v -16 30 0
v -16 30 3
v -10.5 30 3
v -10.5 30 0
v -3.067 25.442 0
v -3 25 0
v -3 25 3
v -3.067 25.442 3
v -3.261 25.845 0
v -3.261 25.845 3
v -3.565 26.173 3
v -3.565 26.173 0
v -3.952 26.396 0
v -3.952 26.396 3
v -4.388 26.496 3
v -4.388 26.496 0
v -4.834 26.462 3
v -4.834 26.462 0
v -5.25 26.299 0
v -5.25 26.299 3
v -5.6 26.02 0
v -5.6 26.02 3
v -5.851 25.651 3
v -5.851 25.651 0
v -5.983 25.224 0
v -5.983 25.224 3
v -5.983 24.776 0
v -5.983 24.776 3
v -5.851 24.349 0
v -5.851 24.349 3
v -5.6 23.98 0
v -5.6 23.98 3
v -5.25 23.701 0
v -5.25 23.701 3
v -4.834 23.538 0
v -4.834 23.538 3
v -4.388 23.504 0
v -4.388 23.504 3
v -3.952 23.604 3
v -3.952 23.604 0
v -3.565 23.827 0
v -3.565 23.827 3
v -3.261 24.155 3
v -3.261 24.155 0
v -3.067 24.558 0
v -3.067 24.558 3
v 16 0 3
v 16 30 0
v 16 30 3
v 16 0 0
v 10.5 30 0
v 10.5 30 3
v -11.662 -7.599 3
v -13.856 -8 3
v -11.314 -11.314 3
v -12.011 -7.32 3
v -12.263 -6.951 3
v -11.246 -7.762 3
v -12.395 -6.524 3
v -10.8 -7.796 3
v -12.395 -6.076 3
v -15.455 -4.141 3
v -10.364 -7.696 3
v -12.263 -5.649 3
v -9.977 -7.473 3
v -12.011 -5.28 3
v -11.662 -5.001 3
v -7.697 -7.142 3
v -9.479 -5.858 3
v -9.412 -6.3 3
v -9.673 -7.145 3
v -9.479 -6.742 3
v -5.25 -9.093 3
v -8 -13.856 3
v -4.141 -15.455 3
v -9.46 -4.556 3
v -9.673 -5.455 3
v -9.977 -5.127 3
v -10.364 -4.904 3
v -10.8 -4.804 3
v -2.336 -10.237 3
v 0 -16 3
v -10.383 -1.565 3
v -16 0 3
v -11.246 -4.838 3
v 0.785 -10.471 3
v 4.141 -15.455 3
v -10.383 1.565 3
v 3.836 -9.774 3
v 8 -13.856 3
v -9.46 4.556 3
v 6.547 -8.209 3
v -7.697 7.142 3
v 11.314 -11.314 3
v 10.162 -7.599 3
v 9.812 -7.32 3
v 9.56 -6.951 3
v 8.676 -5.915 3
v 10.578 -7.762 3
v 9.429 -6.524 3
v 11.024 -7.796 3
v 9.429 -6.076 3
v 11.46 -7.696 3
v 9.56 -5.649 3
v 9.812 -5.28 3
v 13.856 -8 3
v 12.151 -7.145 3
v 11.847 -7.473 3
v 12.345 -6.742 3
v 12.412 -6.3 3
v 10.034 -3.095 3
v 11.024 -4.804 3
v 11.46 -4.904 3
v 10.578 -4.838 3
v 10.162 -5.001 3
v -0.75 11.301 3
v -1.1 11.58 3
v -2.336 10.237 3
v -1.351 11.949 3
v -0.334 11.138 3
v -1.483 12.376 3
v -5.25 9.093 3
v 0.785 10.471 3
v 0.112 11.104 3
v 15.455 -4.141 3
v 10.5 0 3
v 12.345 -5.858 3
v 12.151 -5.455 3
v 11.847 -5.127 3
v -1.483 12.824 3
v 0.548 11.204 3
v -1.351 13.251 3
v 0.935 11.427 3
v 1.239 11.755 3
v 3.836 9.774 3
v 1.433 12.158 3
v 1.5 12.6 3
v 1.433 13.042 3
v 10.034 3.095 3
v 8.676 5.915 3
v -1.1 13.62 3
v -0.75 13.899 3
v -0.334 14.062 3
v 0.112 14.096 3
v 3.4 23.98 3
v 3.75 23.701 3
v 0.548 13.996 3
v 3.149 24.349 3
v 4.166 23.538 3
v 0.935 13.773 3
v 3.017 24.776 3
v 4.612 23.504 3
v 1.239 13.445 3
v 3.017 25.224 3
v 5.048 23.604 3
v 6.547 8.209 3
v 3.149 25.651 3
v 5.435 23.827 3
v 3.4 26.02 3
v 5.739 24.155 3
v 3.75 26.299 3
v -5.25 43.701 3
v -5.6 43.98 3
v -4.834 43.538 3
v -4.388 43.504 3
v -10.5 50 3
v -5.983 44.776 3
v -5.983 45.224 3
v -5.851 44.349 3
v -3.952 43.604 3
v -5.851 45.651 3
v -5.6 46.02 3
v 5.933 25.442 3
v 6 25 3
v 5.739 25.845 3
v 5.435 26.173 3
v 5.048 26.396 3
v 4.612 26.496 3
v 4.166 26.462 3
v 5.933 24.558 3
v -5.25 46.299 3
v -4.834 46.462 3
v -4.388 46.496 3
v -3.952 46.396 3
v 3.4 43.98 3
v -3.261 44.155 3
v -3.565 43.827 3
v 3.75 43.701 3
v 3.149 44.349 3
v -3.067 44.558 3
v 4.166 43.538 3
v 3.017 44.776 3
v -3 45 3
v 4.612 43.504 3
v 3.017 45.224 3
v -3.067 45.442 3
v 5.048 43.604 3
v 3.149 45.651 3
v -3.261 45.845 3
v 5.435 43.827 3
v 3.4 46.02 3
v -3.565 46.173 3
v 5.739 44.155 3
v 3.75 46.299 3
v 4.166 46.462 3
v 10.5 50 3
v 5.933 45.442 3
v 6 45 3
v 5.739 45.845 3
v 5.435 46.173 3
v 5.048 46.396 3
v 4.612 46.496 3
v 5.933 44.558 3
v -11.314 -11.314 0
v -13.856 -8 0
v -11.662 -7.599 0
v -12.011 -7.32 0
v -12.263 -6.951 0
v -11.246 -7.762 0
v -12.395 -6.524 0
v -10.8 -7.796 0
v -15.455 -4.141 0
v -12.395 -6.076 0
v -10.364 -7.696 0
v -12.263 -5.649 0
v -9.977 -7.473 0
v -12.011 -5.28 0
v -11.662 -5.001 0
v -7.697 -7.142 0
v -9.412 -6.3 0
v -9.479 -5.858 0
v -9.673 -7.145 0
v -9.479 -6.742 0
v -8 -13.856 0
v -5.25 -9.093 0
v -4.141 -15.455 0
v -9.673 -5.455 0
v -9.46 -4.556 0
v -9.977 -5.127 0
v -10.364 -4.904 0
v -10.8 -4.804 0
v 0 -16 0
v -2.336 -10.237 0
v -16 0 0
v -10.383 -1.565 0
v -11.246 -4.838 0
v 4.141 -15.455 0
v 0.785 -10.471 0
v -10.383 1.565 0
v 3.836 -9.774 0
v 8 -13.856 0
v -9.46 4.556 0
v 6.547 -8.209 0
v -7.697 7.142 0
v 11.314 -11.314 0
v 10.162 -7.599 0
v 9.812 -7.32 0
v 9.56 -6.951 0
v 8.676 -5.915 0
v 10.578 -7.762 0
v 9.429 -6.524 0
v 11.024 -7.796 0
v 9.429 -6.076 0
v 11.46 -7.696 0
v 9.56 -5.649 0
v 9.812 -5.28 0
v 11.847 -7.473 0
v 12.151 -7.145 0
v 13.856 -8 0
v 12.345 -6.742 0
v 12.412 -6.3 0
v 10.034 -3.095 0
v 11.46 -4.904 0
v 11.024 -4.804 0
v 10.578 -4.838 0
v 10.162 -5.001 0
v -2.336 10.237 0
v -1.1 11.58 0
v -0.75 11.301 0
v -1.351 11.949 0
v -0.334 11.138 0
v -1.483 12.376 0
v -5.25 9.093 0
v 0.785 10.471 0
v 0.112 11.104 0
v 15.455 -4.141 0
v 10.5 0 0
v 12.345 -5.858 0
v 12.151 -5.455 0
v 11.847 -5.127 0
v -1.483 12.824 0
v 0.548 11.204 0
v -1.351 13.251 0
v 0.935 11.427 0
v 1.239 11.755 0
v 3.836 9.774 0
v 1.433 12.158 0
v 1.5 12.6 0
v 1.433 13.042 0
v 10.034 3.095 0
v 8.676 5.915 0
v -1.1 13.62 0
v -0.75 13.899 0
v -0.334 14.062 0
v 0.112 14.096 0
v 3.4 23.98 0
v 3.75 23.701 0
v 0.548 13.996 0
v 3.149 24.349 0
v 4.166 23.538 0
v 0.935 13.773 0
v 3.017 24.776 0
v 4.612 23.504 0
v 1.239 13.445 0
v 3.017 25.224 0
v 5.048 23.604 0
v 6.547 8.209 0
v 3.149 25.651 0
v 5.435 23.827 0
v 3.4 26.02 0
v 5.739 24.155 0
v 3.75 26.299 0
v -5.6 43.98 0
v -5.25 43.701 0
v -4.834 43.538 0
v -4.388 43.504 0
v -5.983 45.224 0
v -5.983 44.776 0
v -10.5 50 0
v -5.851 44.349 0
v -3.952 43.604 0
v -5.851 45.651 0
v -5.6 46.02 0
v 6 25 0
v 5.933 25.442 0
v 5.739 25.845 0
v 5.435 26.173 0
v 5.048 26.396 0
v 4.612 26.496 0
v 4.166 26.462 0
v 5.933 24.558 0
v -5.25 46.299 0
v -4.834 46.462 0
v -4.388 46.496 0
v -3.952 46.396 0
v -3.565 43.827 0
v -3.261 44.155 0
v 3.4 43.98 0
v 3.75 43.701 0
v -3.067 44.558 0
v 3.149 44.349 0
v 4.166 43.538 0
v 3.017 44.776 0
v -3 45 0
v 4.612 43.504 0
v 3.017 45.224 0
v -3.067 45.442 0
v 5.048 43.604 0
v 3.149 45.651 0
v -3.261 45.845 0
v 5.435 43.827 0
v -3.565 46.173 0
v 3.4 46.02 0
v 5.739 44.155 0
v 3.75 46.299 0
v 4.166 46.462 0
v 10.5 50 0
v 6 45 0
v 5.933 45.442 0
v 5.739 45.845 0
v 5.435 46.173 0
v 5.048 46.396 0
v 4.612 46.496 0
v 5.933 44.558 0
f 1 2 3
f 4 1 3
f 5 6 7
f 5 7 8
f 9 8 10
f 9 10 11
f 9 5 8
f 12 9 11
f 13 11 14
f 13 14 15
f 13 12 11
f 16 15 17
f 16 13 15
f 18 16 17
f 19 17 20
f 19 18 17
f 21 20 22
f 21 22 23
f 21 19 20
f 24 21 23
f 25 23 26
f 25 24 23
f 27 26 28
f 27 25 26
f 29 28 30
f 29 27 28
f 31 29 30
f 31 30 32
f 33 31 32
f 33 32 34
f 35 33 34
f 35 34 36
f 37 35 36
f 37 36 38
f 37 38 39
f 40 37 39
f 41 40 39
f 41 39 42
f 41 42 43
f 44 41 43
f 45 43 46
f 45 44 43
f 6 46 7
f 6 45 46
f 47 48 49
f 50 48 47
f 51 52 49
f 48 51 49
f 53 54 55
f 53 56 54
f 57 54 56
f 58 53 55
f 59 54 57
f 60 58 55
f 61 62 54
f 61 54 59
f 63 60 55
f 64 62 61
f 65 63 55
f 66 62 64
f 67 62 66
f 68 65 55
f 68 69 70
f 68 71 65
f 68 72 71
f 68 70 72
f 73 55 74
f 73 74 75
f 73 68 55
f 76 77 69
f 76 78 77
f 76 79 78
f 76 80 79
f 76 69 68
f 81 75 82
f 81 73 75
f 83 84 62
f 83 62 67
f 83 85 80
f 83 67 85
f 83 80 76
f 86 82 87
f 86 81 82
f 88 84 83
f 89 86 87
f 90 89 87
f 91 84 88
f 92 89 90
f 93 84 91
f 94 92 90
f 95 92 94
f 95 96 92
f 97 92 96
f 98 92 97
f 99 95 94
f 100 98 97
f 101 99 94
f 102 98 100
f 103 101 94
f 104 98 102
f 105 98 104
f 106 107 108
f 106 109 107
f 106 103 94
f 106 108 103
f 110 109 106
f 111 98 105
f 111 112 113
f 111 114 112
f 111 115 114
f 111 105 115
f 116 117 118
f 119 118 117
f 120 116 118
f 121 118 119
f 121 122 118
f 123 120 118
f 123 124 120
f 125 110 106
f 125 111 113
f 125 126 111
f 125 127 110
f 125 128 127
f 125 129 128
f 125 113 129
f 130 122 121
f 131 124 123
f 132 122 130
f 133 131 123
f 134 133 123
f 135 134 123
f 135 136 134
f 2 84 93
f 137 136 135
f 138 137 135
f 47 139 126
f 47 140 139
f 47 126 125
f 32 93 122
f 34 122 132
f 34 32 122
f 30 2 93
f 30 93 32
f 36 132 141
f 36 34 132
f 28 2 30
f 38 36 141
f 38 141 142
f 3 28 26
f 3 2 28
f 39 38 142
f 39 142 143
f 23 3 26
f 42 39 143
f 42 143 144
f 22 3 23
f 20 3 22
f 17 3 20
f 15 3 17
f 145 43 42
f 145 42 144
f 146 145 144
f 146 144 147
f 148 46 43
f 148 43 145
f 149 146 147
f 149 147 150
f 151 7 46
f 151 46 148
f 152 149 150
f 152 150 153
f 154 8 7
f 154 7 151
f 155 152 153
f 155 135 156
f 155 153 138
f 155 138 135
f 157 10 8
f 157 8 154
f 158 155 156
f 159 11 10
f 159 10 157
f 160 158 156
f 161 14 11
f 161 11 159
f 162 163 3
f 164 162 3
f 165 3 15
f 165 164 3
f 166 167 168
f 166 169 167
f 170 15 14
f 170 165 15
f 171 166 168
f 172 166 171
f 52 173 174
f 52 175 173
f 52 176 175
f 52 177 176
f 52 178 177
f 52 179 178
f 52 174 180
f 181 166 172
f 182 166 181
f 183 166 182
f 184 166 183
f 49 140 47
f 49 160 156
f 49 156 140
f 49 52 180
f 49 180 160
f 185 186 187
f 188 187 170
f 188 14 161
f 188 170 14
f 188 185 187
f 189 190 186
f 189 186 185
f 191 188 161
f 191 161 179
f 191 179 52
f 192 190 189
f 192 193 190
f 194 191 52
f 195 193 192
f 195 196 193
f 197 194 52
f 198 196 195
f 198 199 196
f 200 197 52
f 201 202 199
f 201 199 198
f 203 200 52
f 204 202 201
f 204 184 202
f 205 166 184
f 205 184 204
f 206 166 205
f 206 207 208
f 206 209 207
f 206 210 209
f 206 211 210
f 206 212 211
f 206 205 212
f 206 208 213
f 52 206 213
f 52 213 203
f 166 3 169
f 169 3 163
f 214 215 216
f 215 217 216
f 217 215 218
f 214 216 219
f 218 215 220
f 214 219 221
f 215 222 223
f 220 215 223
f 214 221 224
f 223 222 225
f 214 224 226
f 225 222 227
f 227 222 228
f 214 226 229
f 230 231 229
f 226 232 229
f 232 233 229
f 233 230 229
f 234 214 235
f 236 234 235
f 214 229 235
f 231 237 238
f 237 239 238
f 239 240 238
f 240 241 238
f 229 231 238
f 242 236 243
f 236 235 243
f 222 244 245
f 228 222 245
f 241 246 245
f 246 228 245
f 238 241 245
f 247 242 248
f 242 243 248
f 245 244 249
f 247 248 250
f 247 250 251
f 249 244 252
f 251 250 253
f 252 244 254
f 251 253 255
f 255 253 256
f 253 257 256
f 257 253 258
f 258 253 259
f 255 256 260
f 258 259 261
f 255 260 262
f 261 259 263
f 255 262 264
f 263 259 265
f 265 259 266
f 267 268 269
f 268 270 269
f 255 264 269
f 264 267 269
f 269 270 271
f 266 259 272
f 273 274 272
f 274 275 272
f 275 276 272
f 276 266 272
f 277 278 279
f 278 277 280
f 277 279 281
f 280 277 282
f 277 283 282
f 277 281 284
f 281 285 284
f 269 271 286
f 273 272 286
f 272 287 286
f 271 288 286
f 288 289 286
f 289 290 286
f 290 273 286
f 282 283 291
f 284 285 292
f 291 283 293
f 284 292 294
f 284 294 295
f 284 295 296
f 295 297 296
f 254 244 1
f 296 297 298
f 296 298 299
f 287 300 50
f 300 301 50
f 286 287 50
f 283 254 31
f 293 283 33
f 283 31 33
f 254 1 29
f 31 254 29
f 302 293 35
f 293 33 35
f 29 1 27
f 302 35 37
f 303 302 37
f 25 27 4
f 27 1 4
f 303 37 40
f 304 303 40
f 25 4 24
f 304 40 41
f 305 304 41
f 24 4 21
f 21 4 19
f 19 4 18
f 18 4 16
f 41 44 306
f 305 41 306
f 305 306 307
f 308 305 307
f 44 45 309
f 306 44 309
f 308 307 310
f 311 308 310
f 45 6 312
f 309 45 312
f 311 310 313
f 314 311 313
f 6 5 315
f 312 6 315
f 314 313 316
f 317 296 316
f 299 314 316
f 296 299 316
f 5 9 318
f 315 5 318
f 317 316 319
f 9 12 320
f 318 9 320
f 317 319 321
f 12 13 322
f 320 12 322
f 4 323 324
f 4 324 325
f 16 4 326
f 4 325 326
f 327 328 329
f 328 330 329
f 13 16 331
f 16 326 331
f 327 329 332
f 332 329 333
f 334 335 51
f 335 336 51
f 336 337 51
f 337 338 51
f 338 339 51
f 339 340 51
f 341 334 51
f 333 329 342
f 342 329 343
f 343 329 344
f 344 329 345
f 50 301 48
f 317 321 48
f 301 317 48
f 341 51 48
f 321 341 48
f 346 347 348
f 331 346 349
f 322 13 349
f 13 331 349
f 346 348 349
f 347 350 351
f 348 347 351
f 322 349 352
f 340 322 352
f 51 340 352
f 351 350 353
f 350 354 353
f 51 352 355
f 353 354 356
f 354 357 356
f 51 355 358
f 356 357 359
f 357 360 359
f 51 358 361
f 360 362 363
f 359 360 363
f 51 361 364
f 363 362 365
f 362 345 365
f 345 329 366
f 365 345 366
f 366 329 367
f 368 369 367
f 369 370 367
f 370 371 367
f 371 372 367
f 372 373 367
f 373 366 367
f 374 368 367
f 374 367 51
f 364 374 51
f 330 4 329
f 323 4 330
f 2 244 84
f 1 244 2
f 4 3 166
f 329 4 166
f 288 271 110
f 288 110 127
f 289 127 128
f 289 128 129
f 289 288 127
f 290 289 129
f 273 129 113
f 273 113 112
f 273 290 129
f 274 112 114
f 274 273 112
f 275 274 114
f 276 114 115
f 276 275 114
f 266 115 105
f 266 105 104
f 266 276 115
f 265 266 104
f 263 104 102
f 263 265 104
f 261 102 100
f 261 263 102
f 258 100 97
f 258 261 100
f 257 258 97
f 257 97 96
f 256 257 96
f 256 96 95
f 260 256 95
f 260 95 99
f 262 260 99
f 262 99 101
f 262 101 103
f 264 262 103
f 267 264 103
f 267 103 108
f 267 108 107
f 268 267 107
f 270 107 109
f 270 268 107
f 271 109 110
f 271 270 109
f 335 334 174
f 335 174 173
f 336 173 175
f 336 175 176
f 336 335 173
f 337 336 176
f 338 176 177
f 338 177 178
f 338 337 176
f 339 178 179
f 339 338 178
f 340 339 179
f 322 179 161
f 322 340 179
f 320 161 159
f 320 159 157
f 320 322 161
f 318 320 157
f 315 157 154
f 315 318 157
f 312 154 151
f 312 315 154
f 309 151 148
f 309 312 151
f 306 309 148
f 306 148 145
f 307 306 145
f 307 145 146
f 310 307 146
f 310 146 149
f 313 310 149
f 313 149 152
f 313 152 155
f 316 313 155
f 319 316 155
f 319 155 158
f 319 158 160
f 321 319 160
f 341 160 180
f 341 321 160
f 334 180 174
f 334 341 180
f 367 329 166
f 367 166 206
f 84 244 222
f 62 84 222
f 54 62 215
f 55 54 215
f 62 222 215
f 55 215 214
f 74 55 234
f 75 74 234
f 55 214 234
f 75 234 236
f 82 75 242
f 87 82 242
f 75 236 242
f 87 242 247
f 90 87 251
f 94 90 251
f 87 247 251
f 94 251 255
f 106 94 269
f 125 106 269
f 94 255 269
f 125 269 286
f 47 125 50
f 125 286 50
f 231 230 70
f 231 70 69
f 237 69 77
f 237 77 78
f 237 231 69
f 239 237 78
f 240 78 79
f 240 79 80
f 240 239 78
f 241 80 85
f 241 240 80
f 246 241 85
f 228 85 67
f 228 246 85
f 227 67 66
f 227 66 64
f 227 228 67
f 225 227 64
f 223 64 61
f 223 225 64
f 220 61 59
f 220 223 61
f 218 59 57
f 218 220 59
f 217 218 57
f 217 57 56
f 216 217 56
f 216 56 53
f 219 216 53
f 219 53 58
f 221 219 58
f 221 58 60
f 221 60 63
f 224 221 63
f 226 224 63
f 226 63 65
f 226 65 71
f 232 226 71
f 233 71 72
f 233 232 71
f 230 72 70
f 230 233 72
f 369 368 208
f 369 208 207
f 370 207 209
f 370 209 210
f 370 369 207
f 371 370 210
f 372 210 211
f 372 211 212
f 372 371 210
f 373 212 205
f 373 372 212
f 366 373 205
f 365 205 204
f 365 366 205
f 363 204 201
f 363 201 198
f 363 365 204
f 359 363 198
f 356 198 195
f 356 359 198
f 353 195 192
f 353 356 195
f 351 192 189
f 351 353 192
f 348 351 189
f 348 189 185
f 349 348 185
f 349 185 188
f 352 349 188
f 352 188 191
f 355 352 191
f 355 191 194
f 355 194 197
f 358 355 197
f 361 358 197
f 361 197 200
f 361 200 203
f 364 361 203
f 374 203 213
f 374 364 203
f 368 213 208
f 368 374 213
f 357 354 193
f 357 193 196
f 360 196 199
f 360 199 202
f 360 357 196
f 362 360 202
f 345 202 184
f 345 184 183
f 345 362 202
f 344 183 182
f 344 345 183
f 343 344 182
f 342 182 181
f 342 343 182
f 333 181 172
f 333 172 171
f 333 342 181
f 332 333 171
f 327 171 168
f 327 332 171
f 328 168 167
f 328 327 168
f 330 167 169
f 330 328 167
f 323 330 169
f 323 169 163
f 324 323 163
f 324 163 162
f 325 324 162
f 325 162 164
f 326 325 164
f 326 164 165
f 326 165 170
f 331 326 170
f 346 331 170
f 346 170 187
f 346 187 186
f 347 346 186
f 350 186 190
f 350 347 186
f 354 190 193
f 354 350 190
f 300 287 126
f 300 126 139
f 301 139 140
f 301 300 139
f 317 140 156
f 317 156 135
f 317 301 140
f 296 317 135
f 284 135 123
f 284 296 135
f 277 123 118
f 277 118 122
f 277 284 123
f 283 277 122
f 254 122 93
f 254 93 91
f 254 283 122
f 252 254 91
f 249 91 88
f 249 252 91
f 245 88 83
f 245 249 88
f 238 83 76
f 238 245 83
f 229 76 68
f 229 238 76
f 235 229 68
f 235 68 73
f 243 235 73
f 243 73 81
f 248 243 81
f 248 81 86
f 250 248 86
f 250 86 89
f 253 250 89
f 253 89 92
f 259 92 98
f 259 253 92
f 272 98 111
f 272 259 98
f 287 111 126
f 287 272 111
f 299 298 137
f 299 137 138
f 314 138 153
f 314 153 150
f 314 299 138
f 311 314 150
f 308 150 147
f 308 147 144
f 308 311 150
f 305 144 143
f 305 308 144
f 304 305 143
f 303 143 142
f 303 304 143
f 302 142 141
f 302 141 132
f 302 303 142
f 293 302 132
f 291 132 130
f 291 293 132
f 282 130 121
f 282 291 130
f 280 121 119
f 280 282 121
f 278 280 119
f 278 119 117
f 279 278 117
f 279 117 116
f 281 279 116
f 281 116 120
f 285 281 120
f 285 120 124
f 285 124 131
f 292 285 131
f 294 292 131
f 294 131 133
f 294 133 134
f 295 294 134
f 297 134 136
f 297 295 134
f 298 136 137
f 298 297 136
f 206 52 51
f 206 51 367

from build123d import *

# Parameters (mm, degrees)
SKETCH_R     = 1.5
SKETCH_R_2   = 10.5
PAD_DEPTH    = 3
SKETCH001_W  = 5.5
SKETCH001_H  = 20
POCKET_DEPTH = 3.001


with BuildPart() as part:
    # Sketch → Pad (new body)
    with BuildSketch(Plane.XY):
        with BuildLine():
            ThreePointArc((-16, 0), (0, -16), (16, 0))
            Line((16, 50), (16, 0))
            Line((-16, 50), (16, 50))
            Line((-16, 0), (-16, 50))
        make_face()
        with Locations((0, 12.6)):
            Circle(SKETCH_R, mode=Mode.SUBTRACT)
        with Locations((10.91192, -6.3)):
            Circle(SKETCH_R, mode=Mode.SUBTRACT)
        with Locations((-10.91192, -6.3)):
            Circle(SKETCH_R, mode=Mode.SUBTRACT)
        Circle(SKETCH_R_2, mode=Mode.SUBTRACT)
        with Locations((-4.5, 45)):
            Circle(SKETCH_R, mode=Mode.SUBTRACT)
        with Locations((4.5, 45)):
            Circle(SKETCH_R, mode=Mode.SUBTRACT)
        with Locations((-4.5, 25)):
            Circle(SKETCH_R, mode=Mode.SUBTRACT)
        with Locations((4.5, 25)):
            Circle(SKETCH_R, mode=Mode.SUBTRACT)
    extrude(amount=PAD_DEPTH)

    # Sketch001 → Pocket (cut, through all)
    with BuildSketch(Plane.XY.offset(3)):
        with Locations((-13.25, 40)):
            Rectangle(SKETCH001_W, SKETCH001_H)
        with Locations((13.25, 40)):
            Rectangle(SKETCH001_W, SKETCH001_H)
    extrude(amount=-POCKET_DEPTH, mode=Mode.SUBTRACT)


solid = part.part
